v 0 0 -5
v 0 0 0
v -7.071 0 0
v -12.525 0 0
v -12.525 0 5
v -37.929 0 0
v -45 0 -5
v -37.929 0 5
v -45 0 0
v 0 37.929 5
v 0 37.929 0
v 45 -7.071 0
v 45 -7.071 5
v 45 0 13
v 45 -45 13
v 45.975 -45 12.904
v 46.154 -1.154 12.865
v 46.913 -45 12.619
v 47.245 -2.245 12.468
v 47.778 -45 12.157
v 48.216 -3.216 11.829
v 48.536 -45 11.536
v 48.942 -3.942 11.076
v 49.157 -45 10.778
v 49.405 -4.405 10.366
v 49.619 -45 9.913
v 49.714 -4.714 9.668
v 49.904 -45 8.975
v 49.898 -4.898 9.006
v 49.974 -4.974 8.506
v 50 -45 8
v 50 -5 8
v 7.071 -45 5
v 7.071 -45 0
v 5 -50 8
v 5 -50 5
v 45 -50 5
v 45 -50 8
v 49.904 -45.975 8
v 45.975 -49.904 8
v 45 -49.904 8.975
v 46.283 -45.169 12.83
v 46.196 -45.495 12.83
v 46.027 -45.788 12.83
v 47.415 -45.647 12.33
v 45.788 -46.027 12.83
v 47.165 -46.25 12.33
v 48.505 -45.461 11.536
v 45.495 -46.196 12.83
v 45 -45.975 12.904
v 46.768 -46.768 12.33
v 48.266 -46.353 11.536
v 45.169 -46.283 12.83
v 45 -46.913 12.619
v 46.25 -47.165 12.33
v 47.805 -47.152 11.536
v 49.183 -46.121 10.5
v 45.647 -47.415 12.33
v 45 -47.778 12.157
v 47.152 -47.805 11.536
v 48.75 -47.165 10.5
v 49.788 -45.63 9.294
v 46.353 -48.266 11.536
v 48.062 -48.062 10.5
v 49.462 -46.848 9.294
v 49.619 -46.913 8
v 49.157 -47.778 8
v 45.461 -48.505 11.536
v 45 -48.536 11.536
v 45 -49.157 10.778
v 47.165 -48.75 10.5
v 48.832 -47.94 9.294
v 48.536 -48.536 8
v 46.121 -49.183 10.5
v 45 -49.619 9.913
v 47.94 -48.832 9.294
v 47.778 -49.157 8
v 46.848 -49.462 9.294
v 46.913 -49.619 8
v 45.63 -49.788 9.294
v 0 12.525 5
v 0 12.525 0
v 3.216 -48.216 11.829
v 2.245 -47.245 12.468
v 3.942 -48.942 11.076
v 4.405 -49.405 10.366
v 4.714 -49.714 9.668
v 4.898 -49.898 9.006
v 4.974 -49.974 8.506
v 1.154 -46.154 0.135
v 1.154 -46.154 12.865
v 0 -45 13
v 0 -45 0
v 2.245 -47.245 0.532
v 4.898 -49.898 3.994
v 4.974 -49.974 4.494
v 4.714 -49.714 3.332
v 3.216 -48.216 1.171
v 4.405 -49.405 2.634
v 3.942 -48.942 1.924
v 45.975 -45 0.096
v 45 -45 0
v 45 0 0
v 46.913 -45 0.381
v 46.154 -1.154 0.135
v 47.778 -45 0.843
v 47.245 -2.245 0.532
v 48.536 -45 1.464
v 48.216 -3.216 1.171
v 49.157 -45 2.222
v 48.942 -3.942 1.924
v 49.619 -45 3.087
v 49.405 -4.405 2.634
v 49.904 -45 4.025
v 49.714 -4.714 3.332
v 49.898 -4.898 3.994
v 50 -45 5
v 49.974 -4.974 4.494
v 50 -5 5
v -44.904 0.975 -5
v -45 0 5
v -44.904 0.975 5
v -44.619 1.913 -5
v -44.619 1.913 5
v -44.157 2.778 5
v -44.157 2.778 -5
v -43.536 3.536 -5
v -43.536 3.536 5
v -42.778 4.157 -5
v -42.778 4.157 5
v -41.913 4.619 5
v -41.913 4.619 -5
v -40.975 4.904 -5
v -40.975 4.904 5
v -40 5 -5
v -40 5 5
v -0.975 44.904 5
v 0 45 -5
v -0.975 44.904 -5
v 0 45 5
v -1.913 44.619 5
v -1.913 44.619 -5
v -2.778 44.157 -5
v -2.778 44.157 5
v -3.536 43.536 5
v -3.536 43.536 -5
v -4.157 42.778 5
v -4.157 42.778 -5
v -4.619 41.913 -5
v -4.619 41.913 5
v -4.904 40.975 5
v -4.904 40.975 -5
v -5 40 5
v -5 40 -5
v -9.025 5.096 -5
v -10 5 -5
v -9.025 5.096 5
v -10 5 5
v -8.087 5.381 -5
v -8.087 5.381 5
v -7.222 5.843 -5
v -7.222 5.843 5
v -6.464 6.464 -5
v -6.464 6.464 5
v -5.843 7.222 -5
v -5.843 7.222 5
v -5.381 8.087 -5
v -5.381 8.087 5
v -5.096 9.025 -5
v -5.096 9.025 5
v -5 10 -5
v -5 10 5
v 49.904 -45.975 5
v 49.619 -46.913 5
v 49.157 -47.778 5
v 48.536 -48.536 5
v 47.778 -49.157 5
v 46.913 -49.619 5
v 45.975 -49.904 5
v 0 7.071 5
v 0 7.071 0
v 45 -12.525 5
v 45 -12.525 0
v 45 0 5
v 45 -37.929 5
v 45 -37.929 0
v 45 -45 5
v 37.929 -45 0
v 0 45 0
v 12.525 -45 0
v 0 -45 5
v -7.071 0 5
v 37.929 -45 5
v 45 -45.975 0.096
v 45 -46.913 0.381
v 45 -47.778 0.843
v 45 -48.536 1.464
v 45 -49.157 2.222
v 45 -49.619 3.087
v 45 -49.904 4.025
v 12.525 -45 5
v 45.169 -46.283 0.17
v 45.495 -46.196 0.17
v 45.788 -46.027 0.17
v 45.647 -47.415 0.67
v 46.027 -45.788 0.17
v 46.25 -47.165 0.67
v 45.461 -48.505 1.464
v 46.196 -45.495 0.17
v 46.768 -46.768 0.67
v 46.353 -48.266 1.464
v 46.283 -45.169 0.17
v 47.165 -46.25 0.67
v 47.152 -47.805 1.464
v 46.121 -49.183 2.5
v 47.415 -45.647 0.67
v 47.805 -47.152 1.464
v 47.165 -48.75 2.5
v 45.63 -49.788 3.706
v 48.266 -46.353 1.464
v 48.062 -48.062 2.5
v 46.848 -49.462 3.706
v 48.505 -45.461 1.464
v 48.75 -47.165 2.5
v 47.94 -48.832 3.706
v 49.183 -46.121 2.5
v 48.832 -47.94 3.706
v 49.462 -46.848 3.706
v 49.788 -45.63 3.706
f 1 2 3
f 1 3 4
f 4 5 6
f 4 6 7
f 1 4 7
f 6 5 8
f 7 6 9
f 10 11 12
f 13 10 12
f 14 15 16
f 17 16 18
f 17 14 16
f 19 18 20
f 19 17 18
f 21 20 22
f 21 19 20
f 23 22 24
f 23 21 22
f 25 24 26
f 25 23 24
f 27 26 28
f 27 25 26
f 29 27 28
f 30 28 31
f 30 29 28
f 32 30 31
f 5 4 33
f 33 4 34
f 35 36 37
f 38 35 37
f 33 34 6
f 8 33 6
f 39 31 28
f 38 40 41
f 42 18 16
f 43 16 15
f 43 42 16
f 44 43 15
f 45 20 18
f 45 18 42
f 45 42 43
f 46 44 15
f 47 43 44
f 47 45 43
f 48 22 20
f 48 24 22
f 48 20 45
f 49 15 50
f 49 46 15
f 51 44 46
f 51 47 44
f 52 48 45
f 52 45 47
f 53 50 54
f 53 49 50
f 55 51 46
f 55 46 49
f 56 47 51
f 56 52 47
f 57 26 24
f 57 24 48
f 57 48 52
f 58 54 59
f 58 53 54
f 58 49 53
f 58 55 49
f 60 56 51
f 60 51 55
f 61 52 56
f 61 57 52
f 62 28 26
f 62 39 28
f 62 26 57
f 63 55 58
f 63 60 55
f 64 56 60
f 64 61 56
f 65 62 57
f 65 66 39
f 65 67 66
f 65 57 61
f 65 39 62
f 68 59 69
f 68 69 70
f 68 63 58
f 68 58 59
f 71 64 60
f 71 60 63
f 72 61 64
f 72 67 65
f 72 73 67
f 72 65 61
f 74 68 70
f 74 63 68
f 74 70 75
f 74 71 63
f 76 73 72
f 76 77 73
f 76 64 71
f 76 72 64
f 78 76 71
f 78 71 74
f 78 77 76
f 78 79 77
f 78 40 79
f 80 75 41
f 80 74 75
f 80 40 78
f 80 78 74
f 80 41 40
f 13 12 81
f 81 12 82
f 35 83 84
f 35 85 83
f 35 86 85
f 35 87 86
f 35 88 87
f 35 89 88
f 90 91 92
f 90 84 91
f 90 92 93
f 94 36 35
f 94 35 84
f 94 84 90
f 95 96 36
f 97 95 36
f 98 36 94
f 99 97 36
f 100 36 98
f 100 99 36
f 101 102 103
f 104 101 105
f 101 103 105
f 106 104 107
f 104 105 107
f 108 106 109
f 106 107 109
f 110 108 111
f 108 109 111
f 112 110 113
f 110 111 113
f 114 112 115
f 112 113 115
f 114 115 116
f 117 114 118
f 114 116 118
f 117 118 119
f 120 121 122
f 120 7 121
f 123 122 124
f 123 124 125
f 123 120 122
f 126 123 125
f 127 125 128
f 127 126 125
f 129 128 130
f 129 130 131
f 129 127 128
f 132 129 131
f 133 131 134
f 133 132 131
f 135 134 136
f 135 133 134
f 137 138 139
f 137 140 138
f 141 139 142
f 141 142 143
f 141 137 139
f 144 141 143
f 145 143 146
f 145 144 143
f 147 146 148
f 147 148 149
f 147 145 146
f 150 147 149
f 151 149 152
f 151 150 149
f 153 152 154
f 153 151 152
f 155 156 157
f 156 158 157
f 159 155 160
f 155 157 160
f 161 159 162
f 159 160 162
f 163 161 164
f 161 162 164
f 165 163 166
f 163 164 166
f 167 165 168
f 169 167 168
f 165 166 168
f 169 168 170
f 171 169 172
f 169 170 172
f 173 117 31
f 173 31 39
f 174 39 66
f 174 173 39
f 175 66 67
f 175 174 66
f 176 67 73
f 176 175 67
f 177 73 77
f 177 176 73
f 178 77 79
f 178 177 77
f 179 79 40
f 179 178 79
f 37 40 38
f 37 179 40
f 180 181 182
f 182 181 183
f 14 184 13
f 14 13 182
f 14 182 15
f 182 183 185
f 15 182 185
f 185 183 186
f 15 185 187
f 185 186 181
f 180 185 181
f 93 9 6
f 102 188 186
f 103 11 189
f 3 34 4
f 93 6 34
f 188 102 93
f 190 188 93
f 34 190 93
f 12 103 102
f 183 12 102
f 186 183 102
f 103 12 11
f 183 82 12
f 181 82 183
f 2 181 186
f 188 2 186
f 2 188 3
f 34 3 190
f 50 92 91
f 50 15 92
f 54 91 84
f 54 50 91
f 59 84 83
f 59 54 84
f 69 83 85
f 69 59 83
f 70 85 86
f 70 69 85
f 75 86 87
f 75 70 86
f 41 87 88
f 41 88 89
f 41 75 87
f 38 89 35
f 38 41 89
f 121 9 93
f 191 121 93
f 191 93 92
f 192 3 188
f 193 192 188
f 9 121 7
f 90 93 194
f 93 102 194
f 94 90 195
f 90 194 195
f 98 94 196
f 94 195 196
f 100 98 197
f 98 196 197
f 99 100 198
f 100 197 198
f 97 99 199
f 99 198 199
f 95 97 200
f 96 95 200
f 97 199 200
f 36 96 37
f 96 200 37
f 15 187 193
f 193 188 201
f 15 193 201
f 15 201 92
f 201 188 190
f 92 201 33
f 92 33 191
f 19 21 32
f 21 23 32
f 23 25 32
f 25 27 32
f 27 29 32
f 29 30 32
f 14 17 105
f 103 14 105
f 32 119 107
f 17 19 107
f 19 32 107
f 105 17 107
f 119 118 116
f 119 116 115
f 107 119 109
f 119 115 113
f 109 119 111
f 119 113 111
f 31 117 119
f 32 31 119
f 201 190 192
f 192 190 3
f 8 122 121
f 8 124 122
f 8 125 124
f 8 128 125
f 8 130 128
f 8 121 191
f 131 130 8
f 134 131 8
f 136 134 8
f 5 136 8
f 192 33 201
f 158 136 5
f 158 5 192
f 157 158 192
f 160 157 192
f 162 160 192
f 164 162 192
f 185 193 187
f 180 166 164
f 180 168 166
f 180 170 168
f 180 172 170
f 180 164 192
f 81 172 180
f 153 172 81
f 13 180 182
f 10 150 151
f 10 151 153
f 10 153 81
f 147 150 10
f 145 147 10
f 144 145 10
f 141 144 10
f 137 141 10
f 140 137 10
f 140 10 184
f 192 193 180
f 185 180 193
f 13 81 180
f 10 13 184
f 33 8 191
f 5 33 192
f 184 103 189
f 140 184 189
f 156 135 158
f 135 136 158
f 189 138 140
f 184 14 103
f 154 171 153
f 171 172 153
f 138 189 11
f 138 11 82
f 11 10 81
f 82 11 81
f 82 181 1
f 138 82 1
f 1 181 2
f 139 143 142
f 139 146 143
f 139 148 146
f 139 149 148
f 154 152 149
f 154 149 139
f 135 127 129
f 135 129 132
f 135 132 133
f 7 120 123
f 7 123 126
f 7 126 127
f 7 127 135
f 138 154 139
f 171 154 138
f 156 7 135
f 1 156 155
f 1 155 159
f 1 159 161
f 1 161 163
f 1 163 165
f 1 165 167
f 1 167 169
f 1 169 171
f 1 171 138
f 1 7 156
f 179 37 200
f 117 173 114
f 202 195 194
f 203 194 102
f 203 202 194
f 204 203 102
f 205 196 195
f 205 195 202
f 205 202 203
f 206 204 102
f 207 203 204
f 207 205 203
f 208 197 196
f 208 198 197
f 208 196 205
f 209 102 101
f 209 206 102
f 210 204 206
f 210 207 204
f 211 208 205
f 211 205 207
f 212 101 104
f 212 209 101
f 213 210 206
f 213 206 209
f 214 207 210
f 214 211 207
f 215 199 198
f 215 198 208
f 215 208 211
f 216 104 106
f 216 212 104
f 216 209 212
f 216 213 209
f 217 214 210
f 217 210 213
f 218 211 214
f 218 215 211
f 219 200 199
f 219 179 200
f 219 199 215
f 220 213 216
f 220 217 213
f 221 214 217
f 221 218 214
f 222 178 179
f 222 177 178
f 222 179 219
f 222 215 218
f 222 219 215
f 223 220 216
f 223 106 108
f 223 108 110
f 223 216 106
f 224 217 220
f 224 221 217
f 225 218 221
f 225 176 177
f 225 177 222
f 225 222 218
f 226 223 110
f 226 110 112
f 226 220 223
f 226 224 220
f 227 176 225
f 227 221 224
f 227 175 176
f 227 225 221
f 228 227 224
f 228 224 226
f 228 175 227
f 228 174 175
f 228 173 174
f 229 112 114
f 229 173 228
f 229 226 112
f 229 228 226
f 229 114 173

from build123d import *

# Parameters (mm, degrees)
F1_DEPTH  = 5
F3_DEPTH  = 5
F5_DEPTH  = 8
F6_SIZE   = 4.99999
F7_R      = 4.99999
F9_DEPTH  = 5
F11_DEPTH = 5


# Not quite as in the source:
# - a fillet or chamfer is up to 0.001 mm smaller than in the source, because OpenCascade refuses the exact size


with BuildPart() as f1:
    # F0 (on Top) → F1 (new body)
    with BuildSketch(Plane.XY):
        Polygon((0, 45), (-5, 45), (-5, 5), (-45, 5), (-45, 0), (0, -45), (0, -50), (50, -50), (50, 0), (45, 0), align=None)
        Polygon((45, -7.0710678119), (45, -45), (7.0710678119, -45), (-37.9289321881, 0), (0, 0), (0, 37.9289321881), align=None, mode=Mode.SUBTRACT)
    extrude(amount=F1_DEPTH)

    # F2 (on face) → F3 (join)
    with BuildSketch(Plane(origin=(0, 0, 0), x_dir=(1, 0, 0), z_dir=(0, 0, -1))):
        Polygon((0, -45), (0, 0), (-45, 0), (-45, -5), (-5, -5), (-5, -45), align=None)
    extrude(amount=F3_DEPTH)

    # F4 (on face) → F5 (join)
    with BuildSketch(Plane.XY.offset(5)):
        Polygon((50, 0), (45, 0), (45, -45), (0, -45), (0, -50), (50, -50), align=None)
    extrude(amount=F5_DEPTH)

    # F6 (size 5 in the source; OpenCascade refuses exactly that, so slightly less here)
    f6_edges = [f1.edges().sort_by_distance(p)[0] for p in [
        (0, -50, 6.5),
        (50, 0, 6.5),
    ]]
    chamfer(f6_edges, length=F6_SIZE)

    # F7 (radius 5 in the source; OpenCascade refuses exactly that, so slightly less here)
    f7_edges = [f1.edges().sort_by_distance(p)[0] for p in [
        (50, -50, 6.5),
        (-5, 45, 0),
        (-45, 5, 0),
        (-5, 5, 0),
        (50, -27.499995, 13),
        (27.499995, -50, 13),
        (27.499995, -50, 0),
        (50, -27.499995, 0),
    ]]
    fillet(f7_edges, radius=F7_R)

    # F8 (on Top) → F9 (join)
    with BuildSketch(Plane.XY):
        Polygon((0, 0), (-7.0710678119, 0), (37.9289321881, -45), (45, -45), (45, -37.9289321881), (0, 7.0710678119), align=None)
    extrude(amount=F9_DEPTH)

    # F10 (on Top) → F11 (join)
    with BuildSketch(Plane.XY):
        Polygon((45, -7.0710678119), (0, 12.524562237), (0, 7.0710678119), (45, -12.524562237), align=None)
        Polygon((12.524562237, -45), (-7.0710678119, 0), (-12.524562237, 0), (7.0710678119, -45), align=None)
    extrude(amount=F11_DEPTH)


solid = f1.part
